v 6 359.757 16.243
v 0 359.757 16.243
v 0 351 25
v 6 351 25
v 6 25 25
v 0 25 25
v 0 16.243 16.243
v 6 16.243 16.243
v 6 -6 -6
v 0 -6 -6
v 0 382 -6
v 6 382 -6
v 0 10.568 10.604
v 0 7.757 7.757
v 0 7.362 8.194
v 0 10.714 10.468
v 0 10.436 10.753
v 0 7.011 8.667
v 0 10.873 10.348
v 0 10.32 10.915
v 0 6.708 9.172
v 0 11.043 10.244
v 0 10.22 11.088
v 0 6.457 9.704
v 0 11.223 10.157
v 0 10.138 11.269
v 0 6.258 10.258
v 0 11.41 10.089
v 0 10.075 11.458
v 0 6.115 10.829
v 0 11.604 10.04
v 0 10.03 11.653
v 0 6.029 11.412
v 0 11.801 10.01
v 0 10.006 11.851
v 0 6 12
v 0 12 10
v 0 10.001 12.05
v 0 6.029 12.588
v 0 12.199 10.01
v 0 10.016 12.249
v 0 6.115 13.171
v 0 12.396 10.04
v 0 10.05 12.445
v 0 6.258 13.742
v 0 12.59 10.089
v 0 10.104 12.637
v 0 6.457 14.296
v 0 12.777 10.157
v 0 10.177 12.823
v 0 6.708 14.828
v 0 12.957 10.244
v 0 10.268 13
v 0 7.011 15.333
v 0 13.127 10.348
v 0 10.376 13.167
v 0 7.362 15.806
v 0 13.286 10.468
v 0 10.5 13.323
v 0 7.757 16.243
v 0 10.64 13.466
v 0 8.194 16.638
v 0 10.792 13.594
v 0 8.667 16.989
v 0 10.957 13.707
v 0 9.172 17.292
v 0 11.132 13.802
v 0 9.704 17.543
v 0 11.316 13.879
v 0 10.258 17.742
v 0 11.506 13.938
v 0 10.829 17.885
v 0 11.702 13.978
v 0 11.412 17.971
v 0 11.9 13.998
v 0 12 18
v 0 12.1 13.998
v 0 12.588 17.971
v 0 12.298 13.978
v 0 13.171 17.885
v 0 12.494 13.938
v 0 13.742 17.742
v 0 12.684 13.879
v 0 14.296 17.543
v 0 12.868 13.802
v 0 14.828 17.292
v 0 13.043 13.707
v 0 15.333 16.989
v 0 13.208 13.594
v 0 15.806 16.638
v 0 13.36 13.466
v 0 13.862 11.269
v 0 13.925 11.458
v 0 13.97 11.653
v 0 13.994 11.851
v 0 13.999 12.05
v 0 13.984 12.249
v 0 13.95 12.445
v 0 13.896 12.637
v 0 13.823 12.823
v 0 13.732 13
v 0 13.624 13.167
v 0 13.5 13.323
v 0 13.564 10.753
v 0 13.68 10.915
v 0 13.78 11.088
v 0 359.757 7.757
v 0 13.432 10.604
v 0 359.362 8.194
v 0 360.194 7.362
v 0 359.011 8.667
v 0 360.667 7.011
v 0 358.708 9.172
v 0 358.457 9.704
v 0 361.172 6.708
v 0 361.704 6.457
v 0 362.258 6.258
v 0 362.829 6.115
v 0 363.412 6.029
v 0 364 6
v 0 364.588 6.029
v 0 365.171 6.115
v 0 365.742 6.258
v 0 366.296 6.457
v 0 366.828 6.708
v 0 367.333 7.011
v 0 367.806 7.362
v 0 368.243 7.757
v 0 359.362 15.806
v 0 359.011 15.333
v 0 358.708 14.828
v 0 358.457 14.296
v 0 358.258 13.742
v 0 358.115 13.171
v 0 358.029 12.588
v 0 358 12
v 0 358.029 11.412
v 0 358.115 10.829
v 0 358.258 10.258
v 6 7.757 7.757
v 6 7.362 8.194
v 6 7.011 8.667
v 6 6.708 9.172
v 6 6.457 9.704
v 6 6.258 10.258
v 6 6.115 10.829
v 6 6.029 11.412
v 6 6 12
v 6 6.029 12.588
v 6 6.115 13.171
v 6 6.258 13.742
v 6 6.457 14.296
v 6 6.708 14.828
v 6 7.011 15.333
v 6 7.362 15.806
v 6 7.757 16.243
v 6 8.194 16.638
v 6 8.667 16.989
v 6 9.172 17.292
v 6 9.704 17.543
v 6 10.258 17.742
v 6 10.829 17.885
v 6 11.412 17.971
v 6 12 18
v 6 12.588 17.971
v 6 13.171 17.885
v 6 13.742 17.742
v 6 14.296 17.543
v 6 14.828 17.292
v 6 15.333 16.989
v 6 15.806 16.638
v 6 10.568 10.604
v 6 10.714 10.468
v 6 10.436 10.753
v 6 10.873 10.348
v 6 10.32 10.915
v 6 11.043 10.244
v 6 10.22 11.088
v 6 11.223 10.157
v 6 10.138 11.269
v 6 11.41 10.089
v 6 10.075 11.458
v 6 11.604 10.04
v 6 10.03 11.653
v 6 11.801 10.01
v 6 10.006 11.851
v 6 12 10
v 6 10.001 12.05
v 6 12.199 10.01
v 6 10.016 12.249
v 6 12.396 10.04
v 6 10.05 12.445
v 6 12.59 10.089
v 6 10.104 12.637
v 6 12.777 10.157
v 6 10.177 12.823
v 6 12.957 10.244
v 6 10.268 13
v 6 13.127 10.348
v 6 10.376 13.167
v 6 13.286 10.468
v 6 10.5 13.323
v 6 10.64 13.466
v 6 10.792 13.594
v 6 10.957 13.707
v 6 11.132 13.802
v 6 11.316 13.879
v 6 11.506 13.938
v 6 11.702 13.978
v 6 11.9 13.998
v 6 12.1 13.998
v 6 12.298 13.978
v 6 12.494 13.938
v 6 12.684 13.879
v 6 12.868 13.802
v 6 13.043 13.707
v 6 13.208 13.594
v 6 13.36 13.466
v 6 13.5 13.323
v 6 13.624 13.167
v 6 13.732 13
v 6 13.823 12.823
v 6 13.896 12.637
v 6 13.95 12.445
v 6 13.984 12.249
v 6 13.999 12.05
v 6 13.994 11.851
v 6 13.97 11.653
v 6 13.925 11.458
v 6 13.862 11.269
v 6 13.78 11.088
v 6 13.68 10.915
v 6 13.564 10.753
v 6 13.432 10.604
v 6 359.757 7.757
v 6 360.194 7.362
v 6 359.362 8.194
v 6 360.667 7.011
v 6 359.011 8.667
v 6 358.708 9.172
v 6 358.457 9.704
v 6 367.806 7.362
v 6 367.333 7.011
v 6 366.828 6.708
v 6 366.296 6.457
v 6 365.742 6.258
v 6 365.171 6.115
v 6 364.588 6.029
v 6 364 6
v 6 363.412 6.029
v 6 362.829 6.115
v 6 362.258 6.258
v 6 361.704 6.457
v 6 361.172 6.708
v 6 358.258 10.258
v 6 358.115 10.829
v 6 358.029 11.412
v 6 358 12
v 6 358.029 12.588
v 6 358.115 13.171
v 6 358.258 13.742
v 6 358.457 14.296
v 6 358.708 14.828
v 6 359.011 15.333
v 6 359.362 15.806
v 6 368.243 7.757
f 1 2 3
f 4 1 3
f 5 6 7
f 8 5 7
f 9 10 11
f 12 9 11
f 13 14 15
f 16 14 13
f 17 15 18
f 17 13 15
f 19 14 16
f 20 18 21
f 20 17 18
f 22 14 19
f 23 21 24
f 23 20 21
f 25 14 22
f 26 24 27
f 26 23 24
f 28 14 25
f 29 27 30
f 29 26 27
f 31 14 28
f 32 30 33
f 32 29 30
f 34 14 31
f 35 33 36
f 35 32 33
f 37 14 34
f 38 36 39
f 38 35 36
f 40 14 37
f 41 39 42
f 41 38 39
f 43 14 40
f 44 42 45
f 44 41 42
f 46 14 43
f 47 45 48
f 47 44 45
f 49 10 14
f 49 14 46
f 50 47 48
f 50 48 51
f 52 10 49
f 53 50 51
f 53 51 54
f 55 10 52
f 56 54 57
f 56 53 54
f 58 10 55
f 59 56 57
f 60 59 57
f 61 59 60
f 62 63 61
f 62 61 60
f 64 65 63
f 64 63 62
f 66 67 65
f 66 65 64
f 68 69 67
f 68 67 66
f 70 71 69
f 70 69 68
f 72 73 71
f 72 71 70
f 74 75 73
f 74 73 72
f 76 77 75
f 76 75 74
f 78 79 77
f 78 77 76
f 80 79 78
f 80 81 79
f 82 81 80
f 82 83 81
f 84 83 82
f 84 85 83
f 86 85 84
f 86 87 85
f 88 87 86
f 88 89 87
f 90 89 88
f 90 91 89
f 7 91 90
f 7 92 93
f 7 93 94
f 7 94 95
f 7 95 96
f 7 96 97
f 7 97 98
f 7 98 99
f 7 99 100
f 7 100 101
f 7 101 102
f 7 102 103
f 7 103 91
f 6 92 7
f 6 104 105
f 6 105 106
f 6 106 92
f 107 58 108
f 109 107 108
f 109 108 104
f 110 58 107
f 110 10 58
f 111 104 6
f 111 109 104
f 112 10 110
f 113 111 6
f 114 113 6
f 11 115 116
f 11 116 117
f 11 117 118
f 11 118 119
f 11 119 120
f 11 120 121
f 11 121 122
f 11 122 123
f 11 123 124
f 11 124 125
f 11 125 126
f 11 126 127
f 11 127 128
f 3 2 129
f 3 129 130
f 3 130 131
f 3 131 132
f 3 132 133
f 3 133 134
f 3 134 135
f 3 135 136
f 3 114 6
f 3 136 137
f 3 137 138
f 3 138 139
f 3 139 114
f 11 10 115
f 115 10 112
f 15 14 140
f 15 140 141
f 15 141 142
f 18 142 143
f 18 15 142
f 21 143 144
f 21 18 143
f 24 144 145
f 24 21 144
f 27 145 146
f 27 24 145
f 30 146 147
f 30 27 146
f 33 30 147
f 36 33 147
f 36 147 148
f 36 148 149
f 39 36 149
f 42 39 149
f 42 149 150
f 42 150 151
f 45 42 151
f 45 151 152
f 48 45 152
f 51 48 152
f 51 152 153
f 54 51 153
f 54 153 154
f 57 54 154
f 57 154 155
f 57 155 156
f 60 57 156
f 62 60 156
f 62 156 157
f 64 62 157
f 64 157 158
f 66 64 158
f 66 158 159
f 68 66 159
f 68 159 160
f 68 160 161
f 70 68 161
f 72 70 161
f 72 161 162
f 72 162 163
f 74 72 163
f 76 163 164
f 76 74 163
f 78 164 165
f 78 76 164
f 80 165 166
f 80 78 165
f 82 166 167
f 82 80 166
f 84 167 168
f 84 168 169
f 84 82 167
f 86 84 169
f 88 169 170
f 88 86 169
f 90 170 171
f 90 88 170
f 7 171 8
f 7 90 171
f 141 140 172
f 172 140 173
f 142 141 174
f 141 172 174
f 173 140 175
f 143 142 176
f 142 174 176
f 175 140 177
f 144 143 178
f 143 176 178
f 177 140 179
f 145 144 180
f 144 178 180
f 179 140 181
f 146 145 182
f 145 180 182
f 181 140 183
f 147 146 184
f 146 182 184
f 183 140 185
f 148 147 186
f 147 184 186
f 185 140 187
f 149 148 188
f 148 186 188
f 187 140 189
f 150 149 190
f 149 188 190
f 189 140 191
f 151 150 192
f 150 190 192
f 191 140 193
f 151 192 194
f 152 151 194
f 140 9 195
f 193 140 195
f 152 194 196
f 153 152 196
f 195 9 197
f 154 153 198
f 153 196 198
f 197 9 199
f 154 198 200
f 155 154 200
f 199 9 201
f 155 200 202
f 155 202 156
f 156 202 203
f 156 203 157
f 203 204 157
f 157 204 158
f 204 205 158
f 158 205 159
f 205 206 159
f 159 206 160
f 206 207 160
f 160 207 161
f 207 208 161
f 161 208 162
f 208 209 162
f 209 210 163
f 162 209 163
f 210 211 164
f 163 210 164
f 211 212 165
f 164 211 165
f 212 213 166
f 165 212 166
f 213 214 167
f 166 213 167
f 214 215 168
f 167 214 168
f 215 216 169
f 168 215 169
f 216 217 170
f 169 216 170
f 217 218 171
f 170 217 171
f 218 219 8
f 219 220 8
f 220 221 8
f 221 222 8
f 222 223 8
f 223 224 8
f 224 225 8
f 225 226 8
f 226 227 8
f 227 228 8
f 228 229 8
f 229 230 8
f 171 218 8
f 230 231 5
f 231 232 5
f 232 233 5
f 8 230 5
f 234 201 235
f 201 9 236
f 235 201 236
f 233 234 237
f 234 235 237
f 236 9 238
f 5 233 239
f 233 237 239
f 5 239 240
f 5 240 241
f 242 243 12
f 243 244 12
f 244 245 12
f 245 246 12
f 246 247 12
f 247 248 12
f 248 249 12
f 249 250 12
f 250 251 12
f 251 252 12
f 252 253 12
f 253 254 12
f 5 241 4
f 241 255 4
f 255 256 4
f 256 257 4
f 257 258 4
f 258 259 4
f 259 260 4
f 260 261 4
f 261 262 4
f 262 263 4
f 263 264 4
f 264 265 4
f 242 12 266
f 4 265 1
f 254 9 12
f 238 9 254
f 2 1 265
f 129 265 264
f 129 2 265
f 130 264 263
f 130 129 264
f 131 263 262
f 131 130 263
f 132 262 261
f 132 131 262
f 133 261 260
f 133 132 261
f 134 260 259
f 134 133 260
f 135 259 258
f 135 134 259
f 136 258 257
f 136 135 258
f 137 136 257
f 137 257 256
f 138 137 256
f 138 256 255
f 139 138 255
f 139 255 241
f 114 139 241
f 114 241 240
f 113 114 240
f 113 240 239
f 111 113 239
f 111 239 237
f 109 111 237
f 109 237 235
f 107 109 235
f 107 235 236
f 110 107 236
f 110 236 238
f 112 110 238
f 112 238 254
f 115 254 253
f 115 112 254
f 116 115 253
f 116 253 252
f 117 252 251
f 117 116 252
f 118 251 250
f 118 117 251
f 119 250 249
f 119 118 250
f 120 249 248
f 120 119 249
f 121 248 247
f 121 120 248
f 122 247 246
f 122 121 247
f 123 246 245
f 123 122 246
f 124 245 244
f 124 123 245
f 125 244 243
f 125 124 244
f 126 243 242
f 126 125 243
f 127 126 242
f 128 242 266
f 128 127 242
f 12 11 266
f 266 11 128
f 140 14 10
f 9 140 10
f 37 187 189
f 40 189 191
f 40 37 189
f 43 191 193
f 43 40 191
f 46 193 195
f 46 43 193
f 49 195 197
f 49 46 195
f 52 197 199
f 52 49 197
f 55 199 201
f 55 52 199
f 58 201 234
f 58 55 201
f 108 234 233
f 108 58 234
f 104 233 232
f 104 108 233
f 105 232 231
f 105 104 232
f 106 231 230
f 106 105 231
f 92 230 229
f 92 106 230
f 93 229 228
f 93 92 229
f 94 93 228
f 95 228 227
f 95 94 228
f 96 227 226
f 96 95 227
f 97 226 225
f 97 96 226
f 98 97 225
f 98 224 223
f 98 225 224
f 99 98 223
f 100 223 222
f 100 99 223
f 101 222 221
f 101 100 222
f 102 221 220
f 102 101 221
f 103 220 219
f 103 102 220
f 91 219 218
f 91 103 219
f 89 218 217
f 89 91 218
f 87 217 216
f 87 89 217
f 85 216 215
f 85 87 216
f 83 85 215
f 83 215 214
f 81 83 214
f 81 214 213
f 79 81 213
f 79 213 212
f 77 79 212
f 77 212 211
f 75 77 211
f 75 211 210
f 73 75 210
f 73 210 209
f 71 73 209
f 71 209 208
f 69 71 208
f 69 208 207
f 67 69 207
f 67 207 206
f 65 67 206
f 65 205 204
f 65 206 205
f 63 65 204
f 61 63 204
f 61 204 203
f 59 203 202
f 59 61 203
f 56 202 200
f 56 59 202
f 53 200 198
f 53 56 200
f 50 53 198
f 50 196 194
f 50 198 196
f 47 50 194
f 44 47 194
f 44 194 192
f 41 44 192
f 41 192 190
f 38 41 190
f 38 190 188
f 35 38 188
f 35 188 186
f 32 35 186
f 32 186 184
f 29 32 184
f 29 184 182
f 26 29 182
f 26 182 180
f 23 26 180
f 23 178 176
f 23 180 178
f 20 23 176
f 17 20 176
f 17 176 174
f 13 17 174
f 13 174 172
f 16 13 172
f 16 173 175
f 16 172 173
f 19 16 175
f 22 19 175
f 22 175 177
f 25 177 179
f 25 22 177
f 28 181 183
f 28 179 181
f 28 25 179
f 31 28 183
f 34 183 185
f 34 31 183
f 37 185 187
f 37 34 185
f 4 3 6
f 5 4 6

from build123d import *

# Parameters (mm, degrees)
BOSS_EXTRUDE1_DEPTH = 6
SKETCH4_R           = 6
BOSS_EXTRUDE2_DEPTH = 6
SKETCH3_R           = 6
SKETCH3_R_2         = 2
CUT_EXTRUDE1_DEPTH  = 383.864205692


with BuildPart() as part:
    # Sketch2 → Boss-Extrude1 (new body)
    with BuildSketch(Plane(origin=(0, 0, 0), x_dir=(0, 0, -1), z_dir=(1, 0, 0))):
        Polygon((6, 382), (-25, 351), (-25, 25), (6, -6), align=None)
    extrude(amount=BOSS_EXTRUDE1_DEPTH)

    # Sketch4 → Boss-Extrude2 (add)
    with BuildSketch(Plane.ZY):
        with Locations((12, 12)):
            Circle(SKETCH4_R)
    extrude(amount=-BOSS_EXTRUDE2_DEPTH)

    # Sketch3 → Cut-Extrude1 (cut, through all)
    with BuildSketch(Plane(origin=(0, 0, 0), x_dir=(0, 0, -1), z_dir=(1, 0, 0))):
        with Locations((-12, 364)):
            Circle(SKETCH3_R)
        with Locations((-12, 12)):
            Circle(SKETCH3_R_2)
    extrude(amount=CUT_EXTRUDE1_DEPTH, mode=Mode.SUBTRACT)


solid = part.part
